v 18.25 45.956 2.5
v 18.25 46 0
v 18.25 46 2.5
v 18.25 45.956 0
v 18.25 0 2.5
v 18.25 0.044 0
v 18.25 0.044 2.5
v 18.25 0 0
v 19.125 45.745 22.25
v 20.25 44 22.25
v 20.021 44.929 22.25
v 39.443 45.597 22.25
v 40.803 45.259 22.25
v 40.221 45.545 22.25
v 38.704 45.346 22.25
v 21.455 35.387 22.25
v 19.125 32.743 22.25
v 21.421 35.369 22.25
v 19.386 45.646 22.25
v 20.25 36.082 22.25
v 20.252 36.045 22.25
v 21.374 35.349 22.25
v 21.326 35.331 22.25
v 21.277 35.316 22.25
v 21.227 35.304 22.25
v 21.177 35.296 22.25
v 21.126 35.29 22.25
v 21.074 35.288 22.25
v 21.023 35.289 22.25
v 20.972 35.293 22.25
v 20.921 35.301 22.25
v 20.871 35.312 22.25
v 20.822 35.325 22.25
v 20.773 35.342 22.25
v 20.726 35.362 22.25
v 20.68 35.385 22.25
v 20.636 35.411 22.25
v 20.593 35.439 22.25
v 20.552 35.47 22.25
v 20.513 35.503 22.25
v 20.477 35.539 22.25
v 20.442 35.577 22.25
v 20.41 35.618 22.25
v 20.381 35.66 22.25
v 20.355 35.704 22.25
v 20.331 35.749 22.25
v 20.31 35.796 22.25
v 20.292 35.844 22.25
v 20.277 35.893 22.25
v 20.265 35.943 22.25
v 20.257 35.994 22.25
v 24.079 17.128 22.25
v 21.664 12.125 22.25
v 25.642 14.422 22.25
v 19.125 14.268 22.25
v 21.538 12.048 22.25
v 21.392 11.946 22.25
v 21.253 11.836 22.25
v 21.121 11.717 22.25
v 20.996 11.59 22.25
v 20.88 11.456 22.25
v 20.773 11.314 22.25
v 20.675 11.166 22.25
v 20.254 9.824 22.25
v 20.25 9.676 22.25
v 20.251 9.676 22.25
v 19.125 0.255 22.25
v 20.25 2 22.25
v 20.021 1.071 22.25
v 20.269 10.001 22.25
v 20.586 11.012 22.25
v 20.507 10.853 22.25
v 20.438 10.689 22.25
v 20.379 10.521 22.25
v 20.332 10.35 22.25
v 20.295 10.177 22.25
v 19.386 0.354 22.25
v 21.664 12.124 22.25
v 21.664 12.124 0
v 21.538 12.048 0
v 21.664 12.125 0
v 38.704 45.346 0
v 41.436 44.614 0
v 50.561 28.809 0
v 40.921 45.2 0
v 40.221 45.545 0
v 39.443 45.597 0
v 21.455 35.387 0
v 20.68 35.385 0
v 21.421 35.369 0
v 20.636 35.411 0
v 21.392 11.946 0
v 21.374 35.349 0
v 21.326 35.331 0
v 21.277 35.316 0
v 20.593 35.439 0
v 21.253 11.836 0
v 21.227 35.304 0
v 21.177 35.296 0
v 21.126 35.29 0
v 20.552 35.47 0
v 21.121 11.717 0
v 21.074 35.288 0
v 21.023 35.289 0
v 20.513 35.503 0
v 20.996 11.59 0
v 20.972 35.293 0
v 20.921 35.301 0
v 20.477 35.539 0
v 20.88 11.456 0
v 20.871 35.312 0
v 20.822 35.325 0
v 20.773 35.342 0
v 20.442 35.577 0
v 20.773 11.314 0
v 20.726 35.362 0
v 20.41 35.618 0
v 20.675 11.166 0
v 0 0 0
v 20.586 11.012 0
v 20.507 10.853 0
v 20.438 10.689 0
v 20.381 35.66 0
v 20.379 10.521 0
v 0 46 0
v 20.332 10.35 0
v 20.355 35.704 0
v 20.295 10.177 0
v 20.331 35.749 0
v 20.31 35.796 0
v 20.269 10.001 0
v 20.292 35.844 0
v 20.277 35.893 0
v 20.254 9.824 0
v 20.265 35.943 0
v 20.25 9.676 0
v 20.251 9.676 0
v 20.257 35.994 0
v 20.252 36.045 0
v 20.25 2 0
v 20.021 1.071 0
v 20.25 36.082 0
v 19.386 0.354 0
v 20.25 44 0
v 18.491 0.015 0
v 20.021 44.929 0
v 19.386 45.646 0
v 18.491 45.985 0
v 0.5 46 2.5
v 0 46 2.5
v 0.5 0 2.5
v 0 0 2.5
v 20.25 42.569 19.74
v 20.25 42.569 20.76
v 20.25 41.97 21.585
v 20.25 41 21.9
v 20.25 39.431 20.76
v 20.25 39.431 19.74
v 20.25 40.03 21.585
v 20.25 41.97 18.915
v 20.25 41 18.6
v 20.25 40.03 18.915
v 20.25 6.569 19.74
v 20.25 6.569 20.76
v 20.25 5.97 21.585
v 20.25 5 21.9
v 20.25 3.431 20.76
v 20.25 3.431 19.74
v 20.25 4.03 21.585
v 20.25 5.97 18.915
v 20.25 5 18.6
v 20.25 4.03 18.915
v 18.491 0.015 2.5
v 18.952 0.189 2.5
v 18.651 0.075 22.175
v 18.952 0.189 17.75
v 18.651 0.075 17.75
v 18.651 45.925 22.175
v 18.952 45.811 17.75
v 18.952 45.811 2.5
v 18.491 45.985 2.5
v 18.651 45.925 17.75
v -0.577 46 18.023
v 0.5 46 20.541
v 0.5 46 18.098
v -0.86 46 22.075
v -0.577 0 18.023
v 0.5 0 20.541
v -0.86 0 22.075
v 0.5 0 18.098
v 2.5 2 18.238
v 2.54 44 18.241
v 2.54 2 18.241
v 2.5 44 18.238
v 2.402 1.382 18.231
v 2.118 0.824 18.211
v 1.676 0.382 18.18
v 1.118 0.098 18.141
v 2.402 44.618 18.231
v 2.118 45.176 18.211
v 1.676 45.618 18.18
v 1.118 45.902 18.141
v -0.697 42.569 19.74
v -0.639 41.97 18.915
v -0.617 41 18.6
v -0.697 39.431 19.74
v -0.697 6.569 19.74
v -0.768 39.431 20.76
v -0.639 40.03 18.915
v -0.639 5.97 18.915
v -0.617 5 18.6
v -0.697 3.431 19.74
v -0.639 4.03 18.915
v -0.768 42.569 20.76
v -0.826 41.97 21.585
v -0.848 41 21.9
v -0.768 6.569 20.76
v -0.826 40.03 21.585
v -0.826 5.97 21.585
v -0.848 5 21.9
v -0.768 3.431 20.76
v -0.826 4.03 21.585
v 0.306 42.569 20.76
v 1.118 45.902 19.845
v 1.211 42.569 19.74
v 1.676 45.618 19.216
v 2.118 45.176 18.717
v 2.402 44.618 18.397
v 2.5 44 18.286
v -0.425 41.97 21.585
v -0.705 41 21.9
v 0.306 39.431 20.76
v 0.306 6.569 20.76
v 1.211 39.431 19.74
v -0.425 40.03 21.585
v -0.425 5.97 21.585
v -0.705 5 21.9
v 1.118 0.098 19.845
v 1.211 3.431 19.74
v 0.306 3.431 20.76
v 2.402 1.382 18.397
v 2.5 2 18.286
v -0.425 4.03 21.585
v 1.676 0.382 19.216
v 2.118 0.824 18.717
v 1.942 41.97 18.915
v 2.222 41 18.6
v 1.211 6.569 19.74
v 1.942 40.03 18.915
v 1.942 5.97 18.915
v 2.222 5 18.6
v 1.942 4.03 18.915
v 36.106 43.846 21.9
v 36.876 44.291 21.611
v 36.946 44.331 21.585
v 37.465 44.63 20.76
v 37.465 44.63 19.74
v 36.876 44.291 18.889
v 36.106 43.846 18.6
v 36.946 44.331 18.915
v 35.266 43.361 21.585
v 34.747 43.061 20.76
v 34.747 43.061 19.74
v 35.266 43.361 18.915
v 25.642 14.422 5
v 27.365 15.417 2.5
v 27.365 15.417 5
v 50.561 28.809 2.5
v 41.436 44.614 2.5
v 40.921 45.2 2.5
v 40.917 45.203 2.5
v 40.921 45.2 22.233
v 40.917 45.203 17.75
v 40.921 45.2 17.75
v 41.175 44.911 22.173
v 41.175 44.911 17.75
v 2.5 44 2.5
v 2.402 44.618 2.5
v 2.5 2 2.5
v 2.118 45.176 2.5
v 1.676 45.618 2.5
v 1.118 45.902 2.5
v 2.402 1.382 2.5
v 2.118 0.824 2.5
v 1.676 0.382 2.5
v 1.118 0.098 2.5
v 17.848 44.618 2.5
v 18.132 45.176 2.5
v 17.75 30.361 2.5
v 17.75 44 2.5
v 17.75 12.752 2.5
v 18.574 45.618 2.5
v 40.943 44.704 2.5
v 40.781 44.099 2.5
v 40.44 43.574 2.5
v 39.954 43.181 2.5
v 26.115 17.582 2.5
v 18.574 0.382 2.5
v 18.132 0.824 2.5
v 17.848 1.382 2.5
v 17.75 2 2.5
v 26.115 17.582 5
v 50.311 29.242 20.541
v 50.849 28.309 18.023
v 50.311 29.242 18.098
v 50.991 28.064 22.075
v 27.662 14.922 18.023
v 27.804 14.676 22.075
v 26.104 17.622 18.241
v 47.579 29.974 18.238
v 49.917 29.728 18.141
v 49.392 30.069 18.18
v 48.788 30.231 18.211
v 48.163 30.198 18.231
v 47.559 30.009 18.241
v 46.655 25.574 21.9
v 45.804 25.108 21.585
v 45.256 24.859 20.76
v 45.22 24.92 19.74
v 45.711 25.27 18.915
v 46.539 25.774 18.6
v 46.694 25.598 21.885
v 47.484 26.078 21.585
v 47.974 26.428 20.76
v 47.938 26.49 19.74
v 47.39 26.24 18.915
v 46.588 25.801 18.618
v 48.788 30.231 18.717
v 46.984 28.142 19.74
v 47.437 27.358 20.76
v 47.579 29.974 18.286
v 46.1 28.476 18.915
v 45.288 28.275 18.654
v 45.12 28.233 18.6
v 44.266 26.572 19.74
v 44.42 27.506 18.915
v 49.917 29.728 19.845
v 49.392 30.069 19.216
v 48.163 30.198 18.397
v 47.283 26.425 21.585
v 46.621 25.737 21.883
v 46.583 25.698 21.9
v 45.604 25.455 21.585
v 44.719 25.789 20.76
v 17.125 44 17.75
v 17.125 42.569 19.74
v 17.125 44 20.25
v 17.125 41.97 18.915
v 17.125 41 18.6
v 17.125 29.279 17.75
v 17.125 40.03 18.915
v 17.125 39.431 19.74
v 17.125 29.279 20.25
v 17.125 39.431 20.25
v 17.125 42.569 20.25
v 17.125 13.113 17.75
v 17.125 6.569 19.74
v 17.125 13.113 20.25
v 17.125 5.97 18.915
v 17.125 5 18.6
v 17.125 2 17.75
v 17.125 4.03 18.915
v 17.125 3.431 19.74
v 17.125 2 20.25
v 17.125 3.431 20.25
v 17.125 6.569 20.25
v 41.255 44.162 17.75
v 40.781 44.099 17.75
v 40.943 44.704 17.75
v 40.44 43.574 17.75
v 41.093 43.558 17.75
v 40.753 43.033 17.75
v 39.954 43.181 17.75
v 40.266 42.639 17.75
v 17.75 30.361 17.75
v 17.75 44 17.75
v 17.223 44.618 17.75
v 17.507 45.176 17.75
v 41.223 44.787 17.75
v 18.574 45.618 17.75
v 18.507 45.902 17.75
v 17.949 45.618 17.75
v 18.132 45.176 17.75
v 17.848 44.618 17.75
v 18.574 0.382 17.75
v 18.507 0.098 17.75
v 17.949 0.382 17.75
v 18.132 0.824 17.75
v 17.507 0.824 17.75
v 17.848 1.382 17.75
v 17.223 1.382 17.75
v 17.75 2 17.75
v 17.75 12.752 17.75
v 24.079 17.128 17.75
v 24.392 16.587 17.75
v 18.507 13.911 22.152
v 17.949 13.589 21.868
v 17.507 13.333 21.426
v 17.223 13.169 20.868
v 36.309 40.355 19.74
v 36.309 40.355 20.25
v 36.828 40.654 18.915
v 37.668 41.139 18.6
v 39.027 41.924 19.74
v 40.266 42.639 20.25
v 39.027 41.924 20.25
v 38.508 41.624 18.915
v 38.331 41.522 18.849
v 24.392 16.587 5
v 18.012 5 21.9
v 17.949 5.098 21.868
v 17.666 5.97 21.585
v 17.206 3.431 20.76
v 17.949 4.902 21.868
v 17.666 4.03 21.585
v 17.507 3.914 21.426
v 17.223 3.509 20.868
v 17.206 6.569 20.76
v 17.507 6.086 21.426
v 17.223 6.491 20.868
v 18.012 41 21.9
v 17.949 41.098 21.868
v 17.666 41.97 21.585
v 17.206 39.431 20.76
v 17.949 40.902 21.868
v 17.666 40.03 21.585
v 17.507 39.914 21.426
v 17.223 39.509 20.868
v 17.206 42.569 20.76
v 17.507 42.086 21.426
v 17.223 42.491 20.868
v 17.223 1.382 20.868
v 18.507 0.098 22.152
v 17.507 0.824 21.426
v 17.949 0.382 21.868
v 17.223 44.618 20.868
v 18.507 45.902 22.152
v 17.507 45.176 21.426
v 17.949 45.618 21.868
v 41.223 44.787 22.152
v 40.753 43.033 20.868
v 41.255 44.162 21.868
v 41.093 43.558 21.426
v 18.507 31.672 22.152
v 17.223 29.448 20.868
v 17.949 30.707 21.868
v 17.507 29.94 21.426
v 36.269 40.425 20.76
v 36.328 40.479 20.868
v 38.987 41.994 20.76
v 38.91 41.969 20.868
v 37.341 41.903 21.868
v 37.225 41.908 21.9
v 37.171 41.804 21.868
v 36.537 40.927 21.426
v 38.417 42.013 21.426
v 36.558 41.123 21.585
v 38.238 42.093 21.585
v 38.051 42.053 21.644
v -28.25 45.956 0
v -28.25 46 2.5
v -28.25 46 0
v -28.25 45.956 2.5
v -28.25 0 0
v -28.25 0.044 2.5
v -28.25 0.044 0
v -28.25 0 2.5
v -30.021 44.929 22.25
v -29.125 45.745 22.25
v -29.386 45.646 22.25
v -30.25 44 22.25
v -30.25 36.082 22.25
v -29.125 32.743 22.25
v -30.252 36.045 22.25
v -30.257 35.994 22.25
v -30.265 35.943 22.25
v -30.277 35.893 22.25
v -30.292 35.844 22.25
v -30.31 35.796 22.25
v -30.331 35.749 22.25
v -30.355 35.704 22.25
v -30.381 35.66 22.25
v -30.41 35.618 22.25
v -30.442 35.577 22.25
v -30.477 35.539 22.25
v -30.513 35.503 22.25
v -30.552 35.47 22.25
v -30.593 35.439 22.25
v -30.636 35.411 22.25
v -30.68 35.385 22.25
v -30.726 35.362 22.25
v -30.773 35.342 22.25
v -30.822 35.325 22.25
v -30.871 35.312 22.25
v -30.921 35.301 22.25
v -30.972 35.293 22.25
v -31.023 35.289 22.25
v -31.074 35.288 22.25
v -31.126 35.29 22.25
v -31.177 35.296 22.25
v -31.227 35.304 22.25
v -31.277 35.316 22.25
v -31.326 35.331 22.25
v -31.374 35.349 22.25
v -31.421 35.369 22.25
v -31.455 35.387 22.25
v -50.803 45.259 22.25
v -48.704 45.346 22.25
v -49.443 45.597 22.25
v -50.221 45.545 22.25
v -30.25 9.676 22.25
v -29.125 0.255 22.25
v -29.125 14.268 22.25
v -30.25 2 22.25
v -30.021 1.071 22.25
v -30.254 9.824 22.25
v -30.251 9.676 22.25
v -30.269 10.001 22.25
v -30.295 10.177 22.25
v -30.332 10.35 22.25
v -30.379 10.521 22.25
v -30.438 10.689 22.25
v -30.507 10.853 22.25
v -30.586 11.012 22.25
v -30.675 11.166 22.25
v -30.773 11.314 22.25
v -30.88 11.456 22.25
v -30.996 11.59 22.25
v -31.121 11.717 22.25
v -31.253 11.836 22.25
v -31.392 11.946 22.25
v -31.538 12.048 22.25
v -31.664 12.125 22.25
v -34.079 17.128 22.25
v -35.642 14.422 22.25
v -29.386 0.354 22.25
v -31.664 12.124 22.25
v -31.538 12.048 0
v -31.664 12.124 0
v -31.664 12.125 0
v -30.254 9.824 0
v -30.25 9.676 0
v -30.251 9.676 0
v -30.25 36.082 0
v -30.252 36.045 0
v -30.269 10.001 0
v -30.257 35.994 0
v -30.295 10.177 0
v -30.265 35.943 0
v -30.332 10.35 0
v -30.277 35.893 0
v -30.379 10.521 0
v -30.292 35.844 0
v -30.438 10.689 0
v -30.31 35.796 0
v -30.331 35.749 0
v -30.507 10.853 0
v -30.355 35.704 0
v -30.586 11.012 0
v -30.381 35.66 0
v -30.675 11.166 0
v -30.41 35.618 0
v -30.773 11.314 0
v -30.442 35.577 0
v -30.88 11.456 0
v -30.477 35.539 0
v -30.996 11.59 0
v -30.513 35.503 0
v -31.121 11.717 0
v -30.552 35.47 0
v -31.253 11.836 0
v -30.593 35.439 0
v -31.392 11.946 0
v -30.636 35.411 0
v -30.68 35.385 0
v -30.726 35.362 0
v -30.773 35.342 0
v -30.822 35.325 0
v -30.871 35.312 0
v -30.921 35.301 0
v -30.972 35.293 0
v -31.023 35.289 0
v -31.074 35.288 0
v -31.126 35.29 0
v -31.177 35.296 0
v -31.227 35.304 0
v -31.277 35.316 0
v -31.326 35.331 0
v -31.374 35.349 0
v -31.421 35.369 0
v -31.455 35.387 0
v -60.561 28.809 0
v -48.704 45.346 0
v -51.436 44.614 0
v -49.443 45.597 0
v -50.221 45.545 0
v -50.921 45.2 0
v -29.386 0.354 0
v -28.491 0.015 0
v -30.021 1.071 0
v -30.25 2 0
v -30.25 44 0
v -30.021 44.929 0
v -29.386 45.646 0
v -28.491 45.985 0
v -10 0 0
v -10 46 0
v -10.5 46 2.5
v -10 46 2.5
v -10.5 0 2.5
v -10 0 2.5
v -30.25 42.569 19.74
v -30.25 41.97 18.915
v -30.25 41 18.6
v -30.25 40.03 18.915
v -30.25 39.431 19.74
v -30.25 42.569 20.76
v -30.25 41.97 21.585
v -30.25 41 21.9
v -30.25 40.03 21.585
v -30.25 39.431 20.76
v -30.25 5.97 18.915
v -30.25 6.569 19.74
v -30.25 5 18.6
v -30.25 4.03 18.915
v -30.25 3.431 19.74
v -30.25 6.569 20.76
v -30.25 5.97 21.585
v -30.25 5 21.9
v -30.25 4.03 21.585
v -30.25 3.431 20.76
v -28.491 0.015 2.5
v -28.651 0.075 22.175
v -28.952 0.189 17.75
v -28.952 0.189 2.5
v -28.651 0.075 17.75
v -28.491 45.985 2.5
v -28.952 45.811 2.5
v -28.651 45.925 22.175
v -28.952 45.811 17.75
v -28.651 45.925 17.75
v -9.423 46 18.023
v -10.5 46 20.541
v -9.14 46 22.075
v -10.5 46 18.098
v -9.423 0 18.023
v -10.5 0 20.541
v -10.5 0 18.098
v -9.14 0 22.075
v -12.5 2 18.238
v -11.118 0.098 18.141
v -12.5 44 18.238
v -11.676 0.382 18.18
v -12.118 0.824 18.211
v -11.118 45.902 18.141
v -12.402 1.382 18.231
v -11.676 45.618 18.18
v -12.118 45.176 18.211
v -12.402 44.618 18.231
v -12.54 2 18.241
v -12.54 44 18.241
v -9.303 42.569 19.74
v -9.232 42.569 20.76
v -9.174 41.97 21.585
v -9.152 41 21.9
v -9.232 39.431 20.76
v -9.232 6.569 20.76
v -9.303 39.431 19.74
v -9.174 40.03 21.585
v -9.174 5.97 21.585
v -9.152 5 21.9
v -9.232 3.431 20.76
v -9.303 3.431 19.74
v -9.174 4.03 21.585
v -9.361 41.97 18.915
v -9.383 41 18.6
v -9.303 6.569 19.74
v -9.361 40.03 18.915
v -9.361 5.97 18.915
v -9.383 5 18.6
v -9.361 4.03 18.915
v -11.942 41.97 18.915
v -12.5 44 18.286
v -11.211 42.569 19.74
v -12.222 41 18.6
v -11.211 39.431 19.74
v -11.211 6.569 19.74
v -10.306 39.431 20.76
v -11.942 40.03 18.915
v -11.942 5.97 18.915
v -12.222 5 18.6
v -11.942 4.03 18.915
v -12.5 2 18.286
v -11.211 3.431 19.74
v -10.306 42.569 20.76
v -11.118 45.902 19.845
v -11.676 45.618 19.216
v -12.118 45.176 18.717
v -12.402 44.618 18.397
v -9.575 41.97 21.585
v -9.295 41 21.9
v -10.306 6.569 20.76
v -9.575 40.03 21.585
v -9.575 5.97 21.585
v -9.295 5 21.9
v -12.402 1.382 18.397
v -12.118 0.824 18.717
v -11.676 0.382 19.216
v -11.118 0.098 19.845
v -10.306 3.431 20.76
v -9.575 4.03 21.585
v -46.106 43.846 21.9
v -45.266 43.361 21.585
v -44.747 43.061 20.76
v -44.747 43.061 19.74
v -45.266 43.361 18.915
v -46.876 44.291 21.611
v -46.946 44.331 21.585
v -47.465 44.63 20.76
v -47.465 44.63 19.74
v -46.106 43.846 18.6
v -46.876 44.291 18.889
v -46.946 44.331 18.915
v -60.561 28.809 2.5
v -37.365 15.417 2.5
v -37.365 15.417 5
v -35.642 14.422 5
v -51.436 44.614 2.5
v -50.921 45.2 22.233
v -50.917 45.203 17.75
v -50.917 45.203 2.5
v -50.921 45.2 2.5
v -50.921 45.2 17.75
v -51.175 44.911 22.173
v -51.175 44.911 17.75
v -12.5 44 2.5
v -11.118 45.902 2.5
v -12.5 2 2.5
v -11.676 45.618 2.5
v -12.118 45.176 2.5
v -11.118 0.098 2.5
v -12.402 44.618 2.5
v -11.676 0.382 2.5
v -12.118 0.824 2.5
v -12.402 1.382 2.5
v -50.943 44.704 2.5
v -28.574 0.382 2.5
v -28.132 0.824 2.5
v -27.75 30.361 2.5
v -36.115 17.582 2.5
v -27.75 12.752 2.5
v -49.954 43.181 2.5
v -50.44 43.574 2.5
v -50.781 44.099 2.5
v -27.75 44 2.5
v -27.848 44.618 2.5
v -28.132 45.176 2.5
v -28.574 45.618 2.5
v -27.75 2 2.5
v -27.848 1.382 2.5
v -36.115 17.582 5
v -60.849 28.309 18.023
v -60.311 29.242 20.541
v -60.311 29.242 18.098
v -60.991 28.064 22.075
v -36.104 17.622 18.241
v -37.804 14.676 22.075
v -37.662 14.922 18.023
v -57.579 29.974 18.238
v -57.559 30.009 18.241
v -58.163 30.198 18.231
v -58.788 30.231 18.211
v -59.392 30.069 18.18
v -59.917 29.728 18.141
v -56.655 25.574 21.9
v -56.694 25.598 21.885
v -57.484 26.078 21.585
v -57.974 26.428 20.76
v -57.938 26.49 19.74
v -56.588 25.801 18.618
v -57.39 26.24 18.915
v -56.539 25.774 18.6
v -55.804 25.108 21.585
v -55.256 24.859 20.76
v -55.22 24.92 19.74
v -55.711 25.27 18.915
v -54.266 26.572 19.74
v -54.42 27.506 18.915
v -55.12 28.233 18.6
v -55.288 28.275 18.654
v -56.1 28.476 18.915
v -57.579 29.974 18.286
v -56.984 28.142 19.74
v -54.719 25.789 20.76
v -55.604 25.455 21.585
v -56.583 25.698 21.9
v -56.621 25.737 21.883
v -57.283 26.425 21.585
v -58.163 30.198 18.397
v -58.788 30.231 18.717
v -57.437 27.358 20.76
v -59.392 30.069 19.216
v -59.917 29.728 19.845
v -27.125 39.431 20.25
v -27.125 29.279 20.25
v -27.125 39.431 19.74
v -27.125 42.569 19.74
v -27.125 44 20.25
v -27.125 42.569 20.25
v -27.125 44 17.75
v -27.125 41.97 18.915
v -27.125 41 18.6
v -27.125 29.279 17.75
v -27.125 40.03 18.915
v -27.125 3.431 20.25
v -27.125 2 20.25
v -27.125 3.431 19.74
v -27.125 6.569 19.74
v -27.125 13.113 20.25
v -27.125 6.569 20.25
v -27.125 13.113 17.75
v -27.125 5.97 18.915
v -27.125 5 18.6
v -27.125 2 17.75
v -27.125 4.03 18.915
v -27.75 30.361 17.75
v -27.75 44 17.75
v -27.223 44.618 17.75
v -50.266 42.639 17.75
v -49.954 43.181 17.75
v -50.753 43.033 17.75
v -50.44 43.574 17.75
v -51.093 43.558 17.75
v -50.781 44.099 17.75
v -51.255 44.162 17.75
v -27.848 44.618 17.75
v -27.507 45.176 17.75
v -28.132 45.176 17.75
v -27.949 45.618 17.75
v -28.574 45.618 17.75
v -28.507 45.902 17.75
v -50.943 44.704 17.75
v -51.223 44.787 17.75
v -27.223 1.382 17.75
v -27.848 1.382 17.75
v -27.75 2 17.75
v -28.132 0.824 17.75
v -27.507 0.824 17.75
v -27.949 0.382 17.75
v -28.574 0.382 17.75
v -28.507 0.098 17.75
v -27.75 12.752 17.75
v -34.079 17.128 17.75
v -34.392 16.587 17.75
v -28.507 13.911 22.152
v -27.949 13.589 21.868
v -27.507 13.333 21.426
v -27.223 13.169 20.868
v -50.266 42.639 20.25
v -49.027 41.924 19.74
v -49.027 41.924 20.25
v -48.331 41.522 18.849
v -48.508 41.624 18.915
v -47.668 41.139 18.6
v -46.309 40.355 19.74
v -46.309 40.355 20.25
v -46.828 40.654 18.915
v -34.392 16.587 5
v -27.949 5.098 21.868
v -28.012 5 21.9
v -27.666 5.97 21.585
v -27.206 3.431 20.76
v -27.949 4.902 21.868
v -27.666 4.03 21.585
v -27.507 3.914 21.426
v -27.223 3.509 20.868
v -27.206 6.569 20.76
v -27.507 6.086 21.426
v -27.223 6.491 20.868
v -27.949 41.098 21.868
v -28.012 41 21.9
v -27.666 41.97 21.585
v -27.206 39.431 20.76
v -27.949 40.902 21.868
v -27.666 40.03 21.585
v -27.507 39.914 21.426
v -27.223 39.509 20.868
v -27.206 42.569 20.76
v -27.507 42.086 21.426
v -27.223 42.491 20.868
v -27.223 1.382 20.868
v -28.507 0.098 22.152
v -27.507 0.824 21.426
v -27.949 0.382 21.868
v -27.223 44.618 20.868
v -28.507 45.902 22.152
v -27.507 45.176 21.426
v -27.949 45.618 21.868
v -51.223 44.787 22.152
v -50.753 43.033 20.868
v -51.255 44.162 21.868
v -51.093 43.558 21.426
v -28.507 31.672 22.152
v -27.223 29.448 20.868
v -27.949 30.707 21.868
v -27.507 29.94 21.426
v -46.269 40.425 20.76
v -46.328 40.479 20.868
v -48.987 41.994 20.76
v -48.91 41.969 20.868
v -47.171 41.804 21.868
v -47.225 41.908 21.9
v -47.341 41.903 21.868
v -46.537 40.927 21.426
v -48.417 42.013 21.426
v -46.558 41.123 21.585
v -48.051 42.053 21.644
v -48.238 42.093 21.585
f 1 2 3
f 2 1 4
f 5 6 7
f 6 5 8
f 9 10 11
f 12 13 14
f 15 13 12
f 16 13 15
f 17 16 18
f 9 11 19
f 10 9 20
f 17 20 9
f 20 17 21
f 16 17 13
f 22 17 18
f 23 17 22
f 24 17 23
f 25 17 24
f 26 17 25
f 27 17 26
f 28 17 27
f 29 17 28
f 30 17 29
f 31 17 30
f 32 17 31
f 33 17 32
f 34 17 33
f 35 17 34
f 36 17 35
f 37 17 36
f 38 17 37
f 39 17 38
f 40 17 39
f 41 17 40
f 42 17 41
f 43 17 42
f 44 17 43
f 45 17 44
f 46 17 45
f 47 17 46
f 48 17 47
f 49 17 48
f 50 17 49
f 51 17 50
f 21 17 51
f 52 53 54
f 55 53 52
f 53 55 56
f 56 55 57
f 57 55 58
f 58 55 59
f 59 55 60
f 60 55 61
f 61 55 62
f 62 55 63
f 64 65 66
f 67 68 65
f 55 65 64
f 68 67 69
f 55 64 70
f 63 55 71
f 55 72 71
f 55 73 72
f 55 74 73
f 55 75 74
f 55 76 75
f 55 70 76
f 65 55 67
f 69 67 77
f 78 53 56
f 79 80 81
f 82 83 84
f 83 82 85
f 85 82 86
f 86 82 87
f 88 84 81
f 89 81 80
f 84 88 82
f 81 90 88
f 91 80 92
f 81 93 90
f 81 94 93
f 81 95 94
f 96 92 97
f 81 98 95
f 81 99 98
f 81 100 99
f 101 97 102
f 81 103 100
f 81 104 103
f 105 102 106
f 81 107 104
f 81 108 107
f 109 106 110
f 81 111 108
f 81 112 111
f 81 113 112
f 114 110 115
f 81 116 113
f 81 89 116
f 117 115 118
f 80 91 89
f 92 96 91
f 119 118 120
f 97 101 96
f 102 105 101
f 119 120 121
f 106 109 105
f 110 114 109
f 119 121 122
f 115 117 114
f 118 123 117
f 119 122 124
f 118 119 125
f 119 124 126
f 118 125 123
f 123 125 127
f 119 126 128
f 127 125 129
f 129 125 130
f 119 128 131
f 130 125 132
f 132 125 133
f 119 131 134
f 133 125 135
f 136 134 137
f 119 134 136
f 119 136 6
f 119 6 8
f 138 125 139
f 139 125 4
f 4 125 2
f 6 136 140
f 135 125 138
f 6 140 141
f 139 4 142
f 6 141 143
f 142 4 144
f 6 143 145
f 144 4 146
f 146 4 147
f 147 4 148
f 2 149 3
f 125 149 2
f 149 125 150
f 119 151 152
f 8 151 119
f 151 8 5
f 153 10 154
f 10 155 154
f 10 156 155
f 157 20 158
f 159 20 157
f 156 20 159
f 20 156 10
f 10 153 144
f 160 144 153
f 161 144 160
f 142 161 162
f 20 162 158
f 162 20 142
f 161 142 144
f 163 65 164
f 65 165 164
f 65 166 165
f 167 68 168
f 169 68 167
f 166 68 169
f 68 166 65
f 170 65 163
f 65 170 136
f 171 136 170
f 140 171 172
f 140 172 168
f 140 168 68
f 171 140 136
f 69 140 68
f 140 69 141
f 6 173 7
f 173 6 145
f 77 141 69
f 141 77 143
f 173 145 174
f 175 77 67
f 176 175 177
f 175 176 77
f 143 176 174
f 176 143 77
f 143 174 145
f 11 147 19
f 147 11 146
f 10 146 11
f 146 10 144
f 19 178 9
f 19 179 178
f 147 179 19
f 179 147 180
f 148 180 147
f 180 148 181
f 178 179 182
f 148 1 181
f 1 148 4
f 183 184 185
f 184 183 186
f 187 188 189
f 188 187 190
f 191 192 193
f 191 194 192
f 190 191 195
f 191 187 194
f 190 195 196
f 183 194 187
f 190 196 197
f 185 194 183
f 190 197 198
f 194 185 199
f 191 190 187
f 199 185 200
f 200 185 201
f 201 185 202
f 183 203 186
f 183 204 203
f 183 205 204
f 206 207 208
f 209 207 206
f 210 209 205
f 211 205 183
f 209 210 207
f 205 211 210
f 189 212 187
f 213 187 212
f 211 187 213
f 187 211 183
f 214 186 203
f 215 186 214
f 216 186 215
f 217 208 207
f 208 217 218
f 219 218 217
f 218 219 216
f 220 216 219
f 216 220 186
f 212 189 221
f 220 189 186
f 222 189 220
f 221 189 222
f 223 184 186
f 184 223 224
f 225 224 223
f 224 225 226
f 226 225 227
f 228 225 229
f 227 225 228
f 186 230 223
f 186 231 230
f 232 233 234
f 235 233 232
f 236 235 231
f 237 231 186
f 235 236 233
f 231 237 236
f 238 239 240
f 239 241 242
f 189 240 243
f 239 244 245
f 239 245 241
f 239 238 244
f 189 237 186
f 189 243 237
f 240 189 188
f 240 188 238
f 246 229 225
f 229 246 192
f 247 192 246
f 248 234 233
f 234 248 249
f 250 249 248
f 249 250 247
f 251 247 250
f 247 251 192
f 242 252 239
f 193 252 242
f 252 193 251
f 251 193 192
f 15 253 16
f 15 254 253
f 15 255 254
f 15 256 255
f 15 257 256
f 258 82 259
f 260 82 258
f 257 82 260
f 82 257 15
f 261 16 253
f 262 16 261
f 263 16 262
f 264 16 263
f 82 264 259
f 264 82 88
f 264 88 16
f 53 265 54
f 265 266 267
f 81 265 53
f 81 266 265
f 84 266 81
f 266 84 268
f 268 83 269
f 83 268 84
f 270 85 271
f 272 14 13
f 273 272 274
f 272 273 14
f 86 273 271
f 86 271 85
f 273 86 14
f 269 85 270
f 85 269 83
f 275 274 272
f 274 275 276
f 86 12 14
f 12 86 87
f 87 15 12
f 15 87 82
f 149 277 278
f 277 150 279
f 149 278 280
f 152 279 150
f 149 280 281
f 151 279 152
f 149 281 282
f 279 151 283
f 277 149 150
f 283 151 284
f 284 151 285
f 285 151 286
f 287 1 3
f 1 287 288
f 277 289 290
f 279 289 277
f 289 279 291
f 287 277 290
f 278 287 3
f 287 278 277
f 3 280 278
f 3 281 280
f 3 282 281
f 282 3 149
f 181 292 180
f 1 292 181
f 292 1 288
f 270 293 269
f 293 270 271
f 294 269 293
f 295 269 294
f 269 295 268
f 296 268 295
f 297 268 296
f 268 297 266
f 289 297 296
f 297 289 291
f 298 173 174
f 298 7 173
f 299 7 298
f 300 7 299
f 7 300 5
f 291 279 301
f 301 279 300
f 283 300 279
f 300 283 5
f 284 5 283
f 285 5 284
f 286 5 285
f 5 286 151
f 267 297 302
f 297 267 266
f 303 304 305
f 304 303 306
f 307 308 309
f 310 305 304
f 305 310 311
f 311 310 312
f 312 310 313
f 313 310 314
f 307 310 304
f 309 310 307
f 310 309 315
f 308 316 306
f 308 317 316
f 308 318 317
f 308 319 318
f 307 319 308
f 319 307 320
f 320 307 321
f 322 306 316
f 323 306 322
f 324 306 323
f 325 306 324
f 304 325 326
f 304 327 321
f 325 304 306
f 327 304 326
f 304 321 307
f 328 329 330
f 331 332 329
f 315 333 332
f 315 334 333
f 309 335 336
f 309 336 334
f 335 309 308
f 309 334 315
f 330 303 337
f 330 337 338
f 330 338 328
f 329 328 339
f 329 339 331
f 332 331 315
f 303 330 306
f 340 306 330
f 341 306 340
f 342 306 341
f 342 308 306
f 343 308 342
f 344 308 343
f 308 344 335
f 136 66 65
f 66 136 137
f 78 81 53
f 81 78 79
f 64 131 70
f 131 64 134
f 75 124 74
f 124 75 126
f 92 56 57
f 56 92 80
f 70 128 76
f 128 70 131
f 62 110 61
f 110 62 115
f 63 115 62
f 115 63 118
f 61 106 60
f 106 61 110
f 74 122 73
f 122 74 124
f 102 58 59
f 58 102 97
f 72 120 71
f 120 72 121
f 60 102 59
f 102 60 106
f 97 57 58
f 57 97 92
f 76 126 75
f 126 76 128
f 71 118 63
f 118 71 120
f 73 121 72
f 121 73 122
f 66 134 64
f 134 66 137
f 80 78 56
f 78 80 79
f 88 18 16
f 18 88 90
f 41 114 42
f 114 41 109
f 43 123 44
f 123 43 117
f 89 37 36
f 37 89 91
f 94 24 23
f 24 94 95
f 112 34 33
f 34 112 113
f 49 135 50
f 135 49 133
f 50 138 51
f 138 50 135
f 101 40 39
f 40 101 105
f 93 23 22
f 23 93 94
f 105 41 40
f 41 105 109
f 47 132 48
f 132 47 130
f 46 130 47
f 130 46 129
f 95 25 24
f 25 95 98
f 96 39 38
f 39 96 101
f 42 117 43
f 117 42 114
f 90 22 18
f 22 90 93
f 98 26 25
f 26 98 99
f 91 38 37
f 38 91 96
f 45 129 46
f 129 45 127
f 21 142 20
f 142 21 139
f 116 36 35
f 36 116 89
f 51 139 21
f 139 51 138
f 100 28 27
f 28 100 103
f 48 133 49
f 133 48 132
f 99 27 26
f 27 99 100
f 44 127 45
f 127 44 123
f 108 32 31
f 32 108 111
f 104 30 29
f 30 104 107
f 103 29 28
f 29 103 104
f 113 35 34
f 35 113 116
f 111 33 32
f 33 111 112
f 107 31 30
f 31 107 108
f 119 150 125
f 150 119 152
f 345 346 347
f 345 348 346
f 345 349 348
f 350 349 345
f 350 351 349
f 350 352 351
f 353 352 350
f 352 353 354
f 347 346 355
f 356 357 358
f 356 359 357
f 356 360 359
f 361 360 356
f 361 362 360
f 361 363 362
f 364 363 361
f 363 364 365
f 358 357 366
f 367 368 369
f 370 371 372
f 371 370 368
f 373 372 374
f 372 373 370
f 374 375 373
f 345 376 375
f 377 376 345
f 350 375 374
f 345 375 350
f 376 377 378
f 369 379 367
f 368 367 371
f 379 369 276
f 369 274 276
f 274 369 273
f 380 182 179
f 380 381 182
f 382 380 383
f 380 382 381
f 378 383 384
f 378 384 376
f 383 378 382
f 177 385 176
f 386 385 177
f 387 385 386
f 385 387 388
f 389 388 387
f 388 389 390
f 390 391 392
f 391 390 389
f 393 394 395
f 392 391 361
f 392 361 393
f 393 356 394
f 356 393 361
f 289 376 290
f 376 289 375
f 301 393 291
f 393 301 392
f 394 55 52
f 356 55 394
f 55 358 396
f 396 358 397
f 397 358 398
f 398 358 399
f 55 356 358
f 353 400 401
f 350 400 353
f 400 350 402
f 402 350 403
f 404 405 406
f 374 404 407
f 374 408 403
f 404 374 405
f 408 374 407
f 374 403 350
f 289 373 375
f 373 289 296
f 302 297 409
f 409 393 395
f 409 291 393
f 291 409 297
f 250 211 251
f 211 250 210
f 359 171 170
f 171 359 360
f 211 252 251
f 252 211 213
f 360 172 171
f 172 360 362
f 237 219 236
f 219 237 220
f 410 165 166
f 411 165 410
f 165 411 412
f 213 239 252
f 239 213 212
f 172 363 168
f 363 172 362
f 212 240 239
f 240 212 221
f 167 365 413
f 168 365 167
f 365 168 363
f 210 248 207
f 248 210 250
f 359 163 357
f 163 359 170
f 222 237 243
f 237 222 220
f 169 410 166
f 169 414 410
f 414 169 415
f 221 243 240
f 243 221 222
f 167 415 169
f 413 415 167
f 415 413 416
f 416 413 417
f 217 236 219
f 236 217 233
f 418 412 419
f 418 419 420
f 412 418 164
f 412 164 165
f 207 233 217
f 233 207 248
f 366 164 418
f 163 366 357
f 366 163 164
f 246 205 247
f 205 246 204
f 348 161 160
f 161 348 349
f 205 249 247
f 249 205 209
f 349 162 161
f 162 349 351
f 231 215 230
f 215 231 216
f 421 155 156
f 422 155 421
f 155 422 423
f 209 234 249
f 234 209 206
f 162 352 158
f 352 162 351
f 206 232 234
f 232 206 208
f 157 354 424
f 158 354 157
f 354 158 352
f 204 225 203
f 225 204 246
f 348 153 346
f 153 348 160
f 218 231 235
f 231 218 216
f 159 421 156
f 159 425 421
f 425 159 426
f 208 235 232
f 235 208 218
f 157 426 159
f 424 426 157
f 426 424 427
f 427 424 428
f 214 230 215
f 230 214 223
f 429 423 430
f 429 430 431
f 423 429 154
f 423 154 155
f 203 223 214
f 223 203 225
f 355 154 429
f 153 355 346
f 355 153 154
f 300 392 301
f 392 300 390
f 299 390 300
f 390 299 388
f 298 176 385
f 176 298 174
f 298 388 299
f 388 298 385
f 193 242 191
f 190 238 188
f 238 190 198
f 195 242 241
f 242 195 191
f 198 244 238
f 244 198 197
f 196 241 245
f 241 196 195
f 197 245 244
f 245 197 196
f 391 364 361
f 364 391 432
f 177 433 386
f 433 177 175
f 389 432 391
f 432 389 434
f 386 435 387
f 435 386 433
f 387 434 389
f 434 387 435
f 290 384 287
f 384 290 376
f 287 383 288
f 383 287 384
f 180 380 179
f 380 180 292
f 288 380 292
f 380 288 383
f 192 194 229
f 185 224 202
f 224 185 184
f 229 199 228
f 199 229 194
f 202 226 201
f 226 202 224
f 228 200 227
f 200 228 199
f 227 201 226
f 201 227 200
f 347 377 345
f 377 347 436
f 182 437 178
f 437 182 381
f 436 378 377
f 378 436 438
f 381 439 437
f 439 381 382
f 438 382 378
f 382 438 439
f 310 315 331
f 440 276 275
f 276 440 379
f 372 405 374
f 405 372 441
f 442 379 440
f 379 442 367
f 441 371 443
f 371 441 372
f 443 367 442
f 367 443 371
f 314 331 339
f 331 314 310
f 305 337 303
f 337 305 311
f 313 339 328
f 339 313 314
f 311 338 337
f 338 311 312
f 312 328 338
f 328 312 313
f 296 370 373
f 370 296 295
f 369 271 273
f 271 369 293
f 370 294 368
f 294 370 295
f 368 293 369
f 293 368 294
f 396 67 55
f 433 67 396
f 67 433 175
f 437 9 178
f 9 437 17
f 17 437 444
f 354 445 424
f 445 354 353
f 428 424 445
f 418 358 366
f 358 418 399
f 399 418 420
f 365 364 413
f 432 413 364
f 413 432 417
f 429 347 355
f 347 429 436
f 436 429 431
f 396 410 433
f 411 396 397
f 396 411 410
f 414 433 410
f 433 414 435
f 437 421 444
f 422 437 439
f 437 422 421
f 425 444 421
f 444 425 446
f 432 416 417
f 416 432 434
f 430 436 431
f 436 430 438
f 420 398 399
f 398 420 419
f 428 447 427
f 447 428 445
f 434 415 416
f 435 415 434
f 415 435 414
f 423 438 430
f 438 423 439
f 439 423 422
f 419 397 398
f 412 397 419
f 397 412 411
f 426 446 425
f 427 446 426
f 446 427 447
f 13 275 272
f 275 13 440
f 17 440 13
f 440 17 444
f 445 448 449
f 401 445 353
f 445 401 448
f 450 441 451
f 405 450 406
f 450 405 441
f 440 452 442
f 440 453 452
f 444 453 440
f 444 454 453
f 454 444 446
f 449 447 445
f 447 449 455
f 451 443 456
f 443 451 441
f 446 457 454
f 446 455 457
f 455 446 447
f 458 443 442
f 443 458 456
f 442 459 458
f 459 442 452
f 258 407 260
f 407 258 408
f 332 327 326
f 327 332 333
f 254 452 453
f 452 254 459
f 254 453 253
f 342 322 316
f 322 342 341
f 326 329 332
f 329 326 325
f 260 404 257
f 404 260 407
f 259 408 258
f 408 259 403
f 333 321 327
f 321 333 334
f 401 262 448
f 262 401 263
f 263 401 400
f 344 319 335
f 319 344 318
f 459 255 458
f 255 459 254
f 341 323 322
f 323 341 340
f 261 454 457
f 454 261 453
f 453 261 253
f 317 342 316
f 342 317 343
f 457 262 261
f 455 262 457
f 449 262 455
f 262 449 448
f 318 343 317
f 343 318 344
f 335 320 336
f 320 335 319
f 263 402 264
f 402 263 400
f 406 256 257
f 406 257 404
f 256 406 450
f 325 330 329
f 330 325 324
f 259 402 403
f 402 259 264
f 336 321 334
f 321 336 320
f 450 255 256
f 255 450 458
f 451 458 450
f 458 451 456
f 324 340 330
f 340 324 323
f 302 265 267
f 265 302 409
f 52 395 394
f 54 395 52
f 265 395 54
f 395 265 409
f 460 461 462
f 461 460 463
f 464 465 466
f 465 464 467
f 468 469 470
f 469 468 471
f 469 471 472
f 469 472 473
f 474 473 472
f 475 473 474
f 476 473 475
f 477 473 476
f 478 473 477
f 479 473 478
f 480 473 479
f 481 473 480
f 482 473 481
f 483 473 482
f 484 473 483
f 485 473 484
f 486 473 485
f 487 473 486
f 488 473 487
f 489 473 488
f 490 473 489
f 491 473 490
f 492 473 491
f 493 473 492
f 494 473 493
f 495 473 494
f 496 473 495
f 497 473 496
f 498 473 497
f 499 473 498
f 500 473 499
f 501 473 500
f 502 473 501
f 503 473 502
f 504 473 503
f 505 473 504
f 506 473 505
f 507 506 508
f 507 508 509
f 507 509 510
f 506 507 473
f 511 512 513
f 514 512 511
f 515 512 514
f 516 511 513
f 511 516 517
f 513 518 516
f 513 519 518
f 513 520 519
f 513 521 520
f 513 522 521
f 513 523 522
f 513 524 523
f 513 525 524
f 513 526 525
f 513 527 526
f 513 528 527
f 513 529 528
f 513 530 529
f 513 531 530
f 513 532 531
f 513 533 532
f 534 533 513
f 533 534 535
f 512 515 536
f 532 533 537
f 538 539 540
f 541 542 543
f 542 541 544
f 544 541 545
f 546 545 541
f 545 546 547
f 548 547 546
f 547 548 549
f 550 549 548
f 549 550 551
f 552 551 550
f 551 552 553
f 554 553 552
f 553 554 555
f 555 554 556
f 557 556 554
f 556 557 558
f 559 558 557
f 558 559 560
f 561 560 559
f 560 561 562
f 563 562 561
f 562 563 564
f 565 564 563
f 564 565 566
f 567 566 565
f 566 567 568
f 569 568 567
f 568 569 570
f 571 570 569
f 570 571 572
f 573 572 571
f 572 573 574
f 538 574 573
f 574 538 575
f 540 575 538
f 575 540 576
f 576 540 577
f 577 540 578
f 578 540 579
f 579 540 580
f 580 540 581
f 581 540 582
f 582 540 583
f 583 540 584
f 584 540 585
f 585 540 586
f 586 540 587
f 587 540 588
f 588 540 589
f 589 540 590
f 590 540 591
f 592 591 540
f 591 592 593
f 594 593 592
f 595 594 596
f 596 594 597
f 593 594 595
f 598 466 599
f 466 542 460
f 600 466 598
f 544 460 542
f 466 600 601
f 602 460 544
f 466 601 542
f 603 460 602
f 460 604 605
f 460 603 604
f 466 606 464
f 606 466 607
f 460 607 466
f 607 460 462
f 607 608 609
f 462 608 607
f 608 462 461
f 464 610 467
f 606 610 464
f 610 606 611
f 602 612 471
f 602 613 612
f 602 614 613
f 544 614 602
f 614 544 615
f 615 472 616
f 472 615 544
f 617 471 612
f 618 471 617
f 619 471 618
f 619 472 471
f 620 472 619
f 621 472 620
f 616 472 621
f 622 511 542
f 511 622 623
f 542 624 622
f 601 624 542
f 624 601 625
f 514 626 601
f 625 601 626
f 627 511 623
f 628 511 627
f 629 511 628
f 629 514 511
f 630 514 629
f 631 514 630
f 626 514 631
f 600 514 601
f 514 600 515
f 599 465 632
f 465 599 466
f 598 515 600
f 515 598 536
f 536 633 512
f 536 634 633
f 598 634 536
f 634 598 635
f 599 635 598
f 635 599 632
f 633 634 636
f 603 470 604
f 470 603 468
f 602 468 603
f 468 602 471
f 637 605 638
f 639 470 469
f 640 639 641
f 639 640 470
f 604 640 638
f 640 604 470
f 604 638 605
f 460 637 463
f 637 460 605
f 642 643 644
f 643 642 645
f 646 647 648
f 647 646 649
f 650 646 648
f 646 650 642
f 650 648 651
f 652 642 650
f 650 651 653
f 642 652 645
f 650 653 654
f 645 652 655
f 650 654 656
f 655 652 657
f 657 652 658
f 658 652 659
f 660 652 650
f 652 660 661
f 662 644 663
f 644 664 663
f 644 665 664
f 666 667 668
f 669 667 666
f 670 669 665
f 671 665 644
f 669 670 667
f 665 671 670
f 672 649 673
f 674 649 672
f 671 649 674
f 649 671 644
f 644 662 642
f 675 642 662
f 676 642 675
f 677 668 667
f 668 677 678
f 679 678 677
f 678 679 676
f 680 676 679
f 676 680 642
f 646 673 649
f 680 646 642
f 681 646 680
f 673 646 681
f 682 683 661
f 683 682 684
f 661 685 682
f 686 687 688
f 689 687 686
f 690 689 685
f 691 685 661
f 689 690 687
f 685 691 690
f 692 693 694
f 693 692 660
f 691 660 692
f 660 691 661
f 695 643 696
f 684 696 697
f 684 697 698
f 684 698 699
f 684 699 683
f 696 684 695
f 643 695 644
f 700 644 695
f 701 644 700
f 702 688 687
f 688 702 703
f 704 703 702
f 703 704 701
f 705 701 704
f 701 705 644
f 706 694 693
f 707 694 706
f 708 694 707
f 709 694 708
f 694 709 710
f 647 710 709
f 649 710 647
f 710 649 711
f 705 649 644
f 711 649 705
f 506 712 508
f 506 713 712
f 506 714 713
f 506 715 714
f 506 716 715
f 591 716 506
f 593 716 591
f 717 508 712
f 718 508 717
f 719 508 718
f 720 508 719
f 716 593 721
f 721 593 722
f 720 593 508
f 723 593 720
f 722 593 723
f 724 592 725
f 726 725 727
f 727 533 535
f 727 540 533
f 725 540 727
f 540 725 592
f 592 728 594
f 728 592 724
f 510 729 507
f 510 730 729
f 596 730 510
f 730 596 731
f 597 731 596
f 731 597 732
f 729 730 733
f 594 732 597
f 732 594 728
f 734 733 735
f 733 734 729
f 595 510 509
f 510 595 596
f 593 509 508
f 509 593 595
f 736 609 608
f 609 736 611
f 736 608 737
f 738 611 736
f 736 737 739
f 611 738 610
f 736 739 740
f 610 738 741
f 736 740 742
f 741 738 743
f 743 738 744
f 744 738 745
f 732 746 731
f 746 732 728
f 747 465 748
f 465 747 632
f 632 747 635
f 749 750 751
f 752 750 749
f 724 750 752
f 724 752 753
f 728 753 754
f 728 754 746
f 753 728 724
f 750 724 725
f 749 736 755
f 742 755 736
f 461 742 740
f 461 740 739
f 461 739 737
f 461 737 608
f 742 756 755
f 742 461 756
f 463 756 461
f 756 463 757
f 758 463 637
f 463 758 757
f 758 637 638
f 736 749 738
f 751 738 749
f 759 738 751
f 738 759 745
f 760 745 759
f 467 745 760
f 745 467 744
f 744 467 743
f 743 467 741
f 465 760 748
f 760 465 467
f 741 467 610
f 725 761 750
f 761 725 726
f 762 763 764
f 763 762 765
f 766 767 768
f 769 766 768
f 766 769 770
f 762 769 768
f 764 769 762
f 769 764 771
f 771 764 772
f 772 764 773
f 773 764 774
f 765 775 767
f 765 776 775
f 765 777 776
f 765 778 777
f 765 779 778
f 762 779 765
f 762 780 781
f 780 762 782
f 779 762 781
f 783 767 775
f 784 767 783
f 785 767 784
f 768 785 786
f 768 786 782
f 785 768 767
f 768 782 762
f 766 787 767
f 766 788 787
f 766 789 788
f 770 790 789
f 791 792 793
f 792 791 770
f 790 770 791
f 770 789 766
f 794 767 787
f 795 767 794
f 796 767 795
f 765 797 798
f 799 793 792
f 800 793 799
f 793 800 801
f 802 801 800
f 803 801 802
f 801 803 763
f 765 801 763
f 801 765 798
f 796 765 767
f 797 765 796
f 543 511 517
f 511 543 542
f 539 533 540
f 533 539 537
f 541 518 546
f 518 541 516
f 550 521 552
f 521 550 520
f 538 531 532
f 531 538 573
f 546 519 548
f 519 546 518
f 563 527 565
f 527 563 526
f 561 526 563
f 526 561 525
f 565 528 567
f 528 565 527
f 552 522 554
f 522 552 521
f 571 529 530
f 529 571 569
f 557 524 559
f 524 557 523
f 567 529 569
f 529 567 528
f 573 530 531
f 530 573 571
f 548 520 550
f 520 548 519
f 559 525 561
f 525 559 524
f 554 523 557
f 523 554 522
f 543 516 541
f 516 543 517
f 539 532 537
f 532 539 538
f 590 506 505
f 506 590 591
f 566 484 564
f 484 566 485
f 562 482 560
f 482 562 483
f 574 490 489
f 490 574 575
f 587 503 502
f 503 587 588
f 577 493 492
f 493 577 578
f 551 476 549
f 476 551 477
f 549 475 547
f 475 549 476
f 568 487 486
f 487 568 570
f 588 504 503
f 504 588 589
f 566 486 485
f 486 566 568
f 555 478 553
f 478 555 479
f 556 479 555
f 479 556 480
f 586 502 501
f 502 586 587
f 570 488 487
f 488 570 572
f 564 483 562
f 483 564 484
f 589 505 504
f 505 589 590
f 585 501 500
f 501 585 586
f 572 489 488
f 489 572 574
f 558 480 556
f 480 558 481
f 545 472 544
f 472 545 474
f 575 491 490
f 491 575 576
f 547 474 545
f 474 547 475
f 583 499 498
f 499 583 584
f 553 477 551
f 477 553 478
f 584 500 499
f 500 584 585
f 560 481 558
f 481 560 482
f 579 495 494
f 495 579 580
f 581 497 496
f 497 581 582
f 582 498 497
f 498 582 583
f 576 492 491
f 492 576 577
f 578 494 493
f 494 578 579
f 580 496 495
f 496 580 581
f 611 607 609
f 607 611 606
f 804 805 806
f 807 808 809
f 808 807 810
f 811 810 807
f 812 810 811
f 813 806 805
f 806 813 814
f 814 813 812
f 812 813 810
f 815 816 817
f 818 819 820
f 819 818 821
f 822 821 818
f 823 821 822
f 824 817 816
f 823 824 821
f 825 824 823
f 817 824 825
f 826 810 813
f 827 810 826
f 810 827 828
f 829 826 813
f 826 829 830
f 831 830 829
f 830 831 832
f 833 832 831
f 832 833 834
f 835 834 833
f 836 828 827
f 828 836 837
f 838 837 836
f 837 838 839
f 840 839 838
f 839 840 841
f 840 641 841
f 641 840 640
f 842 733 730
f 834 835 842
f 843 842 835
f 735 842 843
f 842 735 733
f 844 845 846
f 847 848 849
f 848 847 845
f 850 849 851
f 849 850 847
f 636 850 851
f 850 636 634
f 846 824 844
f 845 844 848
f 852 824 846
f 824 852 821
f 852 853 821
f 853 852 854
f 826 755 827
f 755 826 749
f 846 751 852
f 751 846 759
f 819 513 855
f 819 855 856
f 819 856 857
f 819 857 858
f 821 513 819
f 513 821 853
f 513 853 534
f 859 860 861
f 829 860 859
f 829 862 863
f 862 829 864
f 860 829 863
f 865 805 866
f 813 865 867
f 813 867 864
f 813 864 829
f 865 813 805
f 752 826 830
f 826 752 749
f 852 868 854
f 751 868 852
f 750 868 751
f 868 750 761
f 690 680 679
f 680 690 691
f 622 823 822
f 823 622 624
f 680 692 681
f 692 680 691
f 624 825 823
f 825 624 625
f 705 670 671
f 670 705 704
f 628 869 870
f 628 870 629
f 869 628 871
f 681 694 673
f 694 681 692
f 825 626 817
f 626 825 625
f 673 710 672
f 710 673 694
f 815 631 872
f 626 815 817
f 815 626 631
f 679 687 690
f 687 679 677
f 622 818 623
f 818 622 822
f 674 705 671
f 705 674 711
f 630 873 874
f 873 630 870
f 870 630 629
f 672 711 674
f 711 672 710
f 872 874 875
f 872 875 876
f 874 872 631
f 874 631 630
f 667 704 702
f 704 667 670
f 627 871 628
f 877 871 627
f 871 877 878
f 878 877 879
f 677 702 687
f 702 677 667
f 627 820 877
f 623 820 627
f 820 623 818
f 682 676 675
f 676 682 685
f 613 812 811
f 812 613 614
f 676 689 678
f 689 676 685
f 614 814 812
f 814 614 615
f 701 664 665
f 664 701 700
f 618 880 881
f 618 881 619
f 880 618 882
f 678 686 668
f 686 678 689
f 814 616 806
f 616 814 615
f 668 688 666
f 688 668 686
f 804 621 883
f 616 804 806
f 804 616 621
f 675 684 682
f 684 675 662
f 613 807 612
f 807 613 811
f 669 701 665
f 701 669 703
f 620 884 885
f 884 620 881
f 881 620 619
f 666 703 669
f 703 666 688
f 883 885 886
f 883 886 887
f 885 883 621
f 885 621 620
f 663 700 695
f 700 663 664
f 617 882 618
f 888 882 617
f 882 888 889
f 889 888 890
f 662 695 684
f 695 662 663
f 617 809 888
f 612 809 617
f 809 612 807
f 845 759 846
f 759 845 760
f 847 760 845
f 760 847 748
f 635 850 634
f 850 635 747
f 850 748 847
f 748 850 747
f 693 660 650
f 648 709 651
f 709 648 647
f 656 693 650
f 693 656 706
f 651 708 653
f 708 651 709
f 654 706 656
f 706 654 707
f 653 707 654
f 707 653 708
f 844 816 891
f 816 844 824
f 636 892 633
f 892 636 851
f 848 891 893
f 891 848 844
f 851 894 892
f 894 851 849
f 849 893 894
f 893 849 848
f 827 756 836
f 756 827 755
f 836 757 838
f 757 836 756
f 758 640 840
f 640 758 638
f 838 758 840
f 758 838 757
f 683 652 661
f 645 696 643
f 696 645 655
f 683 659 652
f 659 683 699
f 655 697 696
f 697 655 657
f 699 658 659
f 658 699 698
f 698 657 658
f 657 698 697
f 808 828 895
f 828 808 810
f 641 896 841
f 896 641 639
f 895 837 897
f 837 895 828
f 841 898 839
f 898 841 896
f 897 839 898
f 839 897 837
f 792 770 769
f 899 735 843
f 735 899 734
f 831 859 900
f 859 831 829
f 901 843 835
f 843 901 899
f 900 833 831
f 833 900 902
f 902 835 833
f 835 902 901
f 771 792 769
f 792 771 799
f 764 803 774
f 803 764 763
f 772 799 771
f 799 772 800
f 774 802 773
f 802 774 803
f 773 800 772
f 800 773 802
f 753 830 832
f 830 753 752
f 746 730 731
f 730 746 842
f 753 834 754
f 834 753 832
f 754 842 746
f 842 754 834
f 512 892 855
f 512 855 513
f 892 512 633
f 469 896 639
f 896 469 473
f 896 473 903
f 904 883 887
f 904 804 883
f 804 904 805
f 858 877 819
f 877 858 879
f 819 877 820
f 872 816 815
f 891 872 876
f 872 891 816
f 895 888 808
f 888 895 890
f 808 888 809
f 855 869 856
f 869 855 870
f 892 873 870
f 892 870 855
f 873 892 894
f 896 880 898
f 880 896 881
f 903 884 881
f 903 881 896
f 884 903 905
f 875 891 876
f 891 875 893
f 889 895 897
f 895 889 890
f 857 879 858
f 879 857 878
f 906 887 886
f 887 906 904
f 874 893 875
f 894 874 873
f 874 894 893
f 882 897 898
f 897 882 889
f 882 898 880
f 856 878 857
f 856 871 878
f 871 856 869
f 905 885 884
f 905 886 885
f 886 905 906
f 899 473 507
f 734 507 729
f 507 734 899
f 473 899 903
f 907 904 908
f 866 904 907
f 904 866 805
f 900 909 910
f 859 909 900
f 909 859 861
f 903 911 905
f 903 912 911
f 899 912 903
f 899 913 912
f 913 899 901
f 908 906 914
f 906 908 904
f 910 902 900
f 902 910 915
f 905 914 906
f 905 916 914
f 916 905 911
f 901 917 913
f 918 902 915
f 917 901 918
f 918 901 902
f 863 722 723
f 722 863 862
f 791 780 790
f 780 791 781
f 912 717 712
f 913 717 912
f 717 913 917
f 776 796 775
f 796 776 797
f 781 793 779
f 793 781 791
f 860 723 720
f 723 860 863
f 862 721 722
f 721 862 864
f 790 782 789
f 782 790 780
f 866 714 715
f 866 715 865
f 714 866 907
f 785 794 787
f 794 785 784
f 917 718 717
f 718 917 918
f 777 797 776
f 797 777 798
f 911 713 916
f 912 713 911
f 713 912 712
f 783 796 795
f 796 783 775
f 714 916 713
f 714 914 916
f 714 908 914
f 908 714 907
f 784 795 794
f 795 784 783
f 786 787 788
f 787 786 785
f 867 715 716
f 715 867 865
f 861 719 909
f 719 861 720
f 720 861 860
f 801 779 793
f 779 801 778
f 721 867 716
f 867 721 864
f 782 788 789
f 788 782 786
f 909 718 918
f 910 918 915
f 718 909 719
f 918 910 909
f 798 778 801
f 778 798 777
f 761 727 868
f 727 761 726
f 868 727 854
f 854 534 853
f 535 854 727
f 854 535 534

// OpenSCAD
// file: sweep.scad
// sweep.scad
//
// This code is copied from
// https://github.com/openscad/list-comprehension-demos
// and
// https://github.com/openscad/scad-utils
// to make hangprinter repo self-contained
// It was included in order to make the worm drive parametric
// In future OpenSCAD (or other script CAD programs)
// worm drives should be will be more easily constructed without
// this user space defined sweep operation.
// See OpenSCAD discussion at:
// https://github.com/openscad/openscad/issues/114

// Look into files
// lists.scad
// X transformations.scad
// linalg.scad
// se3.scad
// so3.scad


// Include modules and fcts:

/// linalg.scad
function vec3(p) = len(p) < 3 ? concat(p,0) : p;
function vec4(p) = let (v3=vec3(p)) len(v3) < 4 ? concat(v3,1) : v3;
function take3(v) = [v[0],v[1],v[2]];
function tail3(v) = [v[3],v[4],v[5]];
function construct_Rt(R,t) = [concat(R[0],t[0]),concat(R[1],t[1]),concat(R[2],t[2]),[0,0,0,1]];


/// so3.scad

function so3_exp_2(theta_sq) = [
	1.0 - theta_sq * (1.0 - theta_sq/20) / 6,
	0.5 - 0.25/6 * theta_sq
];


// Taylor series expansions close to 0
function so3_exp_1(theta_sq) = [
	1 - 1/6*theta_sq,
	0.5
];

function rodrigues_so3_exp(w, A, B) = [
  [1.0 - B*(w[1]*w[1] + w[2]*w[2]), B*(w[0]*w[1]) - A*w[2],          B*(w[0]*w[2]) + A*w[1]],
  [B*(w[0]*w[1]) + A*w[2],          1.0 - B*(w[0]*w[0] + w[2]*w[2]), B*(w[1]*w[2]) - A*w[0]],
  [B*(w[0]*w[2]) - A*w[1],          B*(w[1]*w[2]) + A*w[0],          1.0 - B*(w[0]*w[0] + w[1]*w[1])]
];

function so3_exp_3_0(theta_deg, inv_theta) = [
	sin(theta_deg) * inv_theta,
	(1 - cos(theta_deg)) * (inv_theta * inv_theta)
];

/// se3.scad
function se3_exp_2(t,w) = se3_exp_2_0(t,w,w*w);
function se3_exp_2_0(t,w,theta_sq) =
se3_exp_23(
	so3_exp_2(theta_sq),
	C = (1.0 - theta_sq/20) / 6,
	t=t,w=w);

function combine_se3_exp(w, ABt) = construct_Rt(rodrigues_so3_exp(w, ABt[0], ABt[1]), ABt[2]);
function se3_exp_1(t,w) = concat(
	so3_exp_1(w*w),
	[t + 0.5 * cross(w,t)]
);

function se3_exp_3(t,w) = se3_exp_3_0(t,w,sqrt(w*w)*180/PI,1/sqrt(w*w));

function se3_exp_23(AB,C,t,w) =
[AB[0], AB[1], t + AB[1] * cross(w,t) + C * cross(w,cross(w,t)) ];

function se3_exp_3_0(t,w,theta_deg,inv_theta) =
se3_exp_23(
	so3_exp_3_0(theta_deg = theta_deg, inv_theta = inv_theta),
	C = (1 - sin(theta_deg) * inv_theta) * (inv_theta * inv_theta),
t=t,w=w);

function se3_exp(mu) = se3_exp_0(t=take3(mu),w=tail3(mu)/180*PI);

function se3_exp_0(t,w) =
combine_se3_exp(w,
// Evaluate by Taylor expansion when near 0
	w*w < 1e-8
	? se3_exp_1(t,w)
	: w*w < 1e-6
	  ? se3_exp_2(t,w)
	  : se3_exp_3(t,w)
);


/// lists.scad
/*!
  Flattens a list one level:

  flatten([[0,1],[2,3]]) => [0,1,2,3]
*/
function flatten(list) = [ for (i = list, v = i) v ];
/*!
  Extracts a subarray from index begin (inclusive) to end (exclusive)

  subarray([1,2,3,4], 1, 2) => [2,3]
*/
function subarray(list,begin=0,end=-1) = [
    let(end = end < 0 ? len(list) : end)
      for (i = [begin : 1 : end-1])
        list[i]
];

/// transformations.scad
//********* Create modifying matrices ***************//
/*!
  Creates a rotation matrix

  xyz = euler angles = rz * ry * rx
  axis = rotation_axis * rotation_angle
*/
function rotation(xyz=undef, axis=undef) =
	xyz != undef && axis != undef ? undef :
	xyz == undef  ? se3_exp([0,0,0,axis[0],axis[1],axis[2]]) :
	len(xyz) == undef ? rotation(axis=[0,0,xyz]) :
	(len(xyz) >= 3 ? rotation(axis=[0,0,xyz[2]]) : identity4()) *
	(len(xyz) >= 2 ? rotation(axis=[0,xyz[1],0]) : identity4()) *
(len(xyz) >= 1 ? rotation(axis=[xyz[0],0,0]) : identity4());

/*!
  Creates a scaling matrix
*/
function scaling(v) = [
	[v[0],0,0,0],
	[0,v[1],0,0],
	[0,0,v[2],0],
	[0,0,0,1],
];

/*!
  Creates a translation matrix
*/
function translation(v) = [
	[1,0,0,v[0]],
	[0,1,0,v[1]],
	[0,0,1,v[2]],
	[0,0,0,1],
];


function project(x) = subarray(x,end=len(x)-1) / x[len(x)-1];

function transform(m, list) = [for (p=list) project(m * vec4(p))];

function to_3d(list) = [ for(v = list) vec3(v) ];

module sweep(shape, path_transforms, closed=false) {

    pathlen = len(path_transforms);
    segments = pathlen + (closed ? 0 : -1);
    shape3d = to_3d(shape);

    function sweep_points() =
      flatten([for (i=[0:pathlen-1])
        transform(path_transforms[i], shape3d)]);

    function loop_faces() = [let (facets=len(shape3d))
        for(s=[0:segments-1], i=[0:facets-1])
          [(s%pathlen) * facets + i,
           (s%pathlen) * facets + (i + 1) % facets,
           ((s + 1) % pathlen) * facets + (i + 1) % facets,
           ((s + 1) % pathlen) * facets + i]];

    bottom_cap = closed ? [] : [[for (i=[len(shape3d)-1:-1:0]) i]];
    top_cap = closed ? [] : [
      [for (i=[0:len(shape3d)-1])
        i+len(shape3d)*(pathlen-1)]];
    polyhedron(points = sweep_points(),
               faces  = concat(loop_faces(),
                               bottom_cap,
                               top_cap),
               convexity=5);
}
// file: parameters.scad
// Parameters shared between modules

Beam_width = 15;
Wiggle = 0.25;
Fat_beam_width = Beam_width + Wiggle;
Beam_length = 400;
Wall_th = 2.5;
Nema17_cube_width          = 42.43;
Nema17_screw_hole_width    = 43.74; // Opposite corner screws
Nema17_ring_diameter       = 22;
Nema17_cube_height         = 39.36;
Nema17_shaft_height        = 63.65;
Nema17_ring_height         = 2;
Nema17_screw_hole_width    = 43.74; // Opposite corner screws
Nema17_shaft_radius        = 5/2;
Nema23_cube_width          = 56;
Nema23_screw_hole_width    = 66.61;
Nema23_screw_holes          = 66.61;
Nema23_ring_diameter       = 38;
Nema23_cube_height         = 56;
Nema23_shaft_height        = 21;
Nema23_ring_height         = 2;
Nema23_shaft_radius        = 6.35/2;

b608_outer_dia = 22.2;
b608_width = 7.05;

Gap_between_sandwich_and_plate = 1.7;

Clamp_wall_extra_length = 4.5;
Clamp_wall_flex_factor = 1.5;
// main file
include <parameters.scad>
use <sweep.scad>
use <util.scad>


translate([-10,0,0]) mirror([1,0,0]) beam_clamp();
beam_clamp();
module beam_clamp(){
  wall_th = Wall_th;
  l0 = 46;
  l1 = 35;
  edges = 0.625;
  opening_width = Fat_beam_width - 2*edges;

  module rot_move(){
    translate([Fat_beam_width+2*wall_th,(l0 - (2/sqrt(3))*(Fat_beam_width+2*wall_th))/2,0])
      rotate([0,0,-60])
        translate([-Fat_beam_width-2*wall_th,0,0])
          children();
  }

  module antibalk(){
    extralen = 2;
    translate([wall_th+edges, -extralen, wall_th])
      cube([opening_width, l0+2*extralen, 100]);
    translate([Fat_beam_width+wall_th, -extralen, wall_th])
      rotate([0,0,90])
        fat_beam(l0+2*extralen);
  }

  difference(){
    union(){
      r0 = 2; // inner round corner radius
      a0 = 60;
      sink0 = r0*sin(15)*2/sqrt(6);
      r1 = 1;
      a1 = 120;
      sink1 = r1*2/sqrt(30);
      translate([wall_th+0.9,0,0])
      rounded_cube2([Fat_beam_width+wall_th-0.9, l0, Fat_beam_width+2*wall_th+2], 2);
      cube([wall_th+3,l0,wall_th]);

      translate([Fat_beam_width/2+wall_th, 0, Fat_beam_width/2+wall_th])
        rotate([0,-90,-90])
        clamp_wall(l0, lift_tri=1.0, edge=edges);

      rot_move(){
        translate([Fat_beam_width+2*wall_th,0,0])
          rotate([0,0,90]){
            difference(){
              one_rounded_cube3([l1, Fat_beam_width+2*wall_th, Fat_beam_width+2*wall_th+2],2,$fn=16);
              // Make space for clamp wall
              translate([Fat_beam_width/sqrt(6)+2-0.01,-1,wall_th])
                cube([l1, 2*wall_th, Fat_beam_width+2*wall_th+2]);
            }
        }
        translate([Fat_beam_width/2+Wall_th, Fat_beam_width/sqrt(6)+2, Fat_beam_width/2+wall_th])
          mirror([1,0,0])
          rotate([0,-90,-90])
          clamp_wall(l1-Fat_beam_width/sqrt(6)-2, lift_tri=1.0, edge=edges);
        translate([Fat_beam_width+2*wall_th,0,0])
          rotate([0,0,-15])
            translate([-sink0,-sink0,0])
              inner_round_corner(r0/(1-cos(a0/2+45)-(1-sin(a0/2+45))),
                                 Fat_beam_width+2*wall_th+2, a0, $fn=100);
        translate([0,(1/sqrt(3))*(Fat_beam_width+2*wall_th) + (0)*r1,0])
          rotate([0,0,-15])
            translate([-sink1,sink1,0])
              rotate([0,0,90])
                inner_round_corner(r1/(1-cos(a1/2+45)-(1-sin(a1/2+45))),
                                   Fat_beam_width+2*wall_th+2, a1, 0.4, $fn=100);
      }
    }
    scrw_fr_edg = 5;
    antibalk();
    rot_move()
      antibalk();
    for(y=[scrw_fr_edg, l0-scrw_fr_edg])
      translate([-2, y, Fat_beam_width+2*wall_th+2-2])
        rotate([0,90,0])
          cylinder(d=3.3, h=Fat_beam_width+2*wall_th+4, $fn=10);
    rot_move()
      translate([-2, l1 - scrw_fr_edg, Fat_beam_width+2*wall_th+2-2])
        rotate([0,90,0])
          cylinder(d=3.3, h=Fat_beam_width+2*wall_th+4, $fn=10);
    rot_move()
      translate([Fat_beam_width/2, (Fat_beam_width)*(1/sqrt(6)), wall_th*2])
      cube([Fat_beam_width+2*wall_th+2, 2, 100]);

    opening_corners(left_one_height=2*Fat_beam_width, wall_th=wall_th, edges=edges);
    mirror([0,1,0])
      translate([0,-l0,0])
      opening_corners(left_one_height=2*Fat_beam_width, wall_th=wall_th, edges=edges);
    rot_move()
      mirror([0,1,0])
      translate([0,-l1,0])
      opening_corners(right_one_height=2*Fat_beam_width, wall_th=wall_th, edges=edges);
    opening_top(exclude_left = true, wall_th=wall_th, edges=edges, l=l0+2);
    rot_move()
      translate([0,-2,0])
      opening_top(exclude_right = true, wall_th=wall_th, edges=edges, l=l0+2);

  }
}
